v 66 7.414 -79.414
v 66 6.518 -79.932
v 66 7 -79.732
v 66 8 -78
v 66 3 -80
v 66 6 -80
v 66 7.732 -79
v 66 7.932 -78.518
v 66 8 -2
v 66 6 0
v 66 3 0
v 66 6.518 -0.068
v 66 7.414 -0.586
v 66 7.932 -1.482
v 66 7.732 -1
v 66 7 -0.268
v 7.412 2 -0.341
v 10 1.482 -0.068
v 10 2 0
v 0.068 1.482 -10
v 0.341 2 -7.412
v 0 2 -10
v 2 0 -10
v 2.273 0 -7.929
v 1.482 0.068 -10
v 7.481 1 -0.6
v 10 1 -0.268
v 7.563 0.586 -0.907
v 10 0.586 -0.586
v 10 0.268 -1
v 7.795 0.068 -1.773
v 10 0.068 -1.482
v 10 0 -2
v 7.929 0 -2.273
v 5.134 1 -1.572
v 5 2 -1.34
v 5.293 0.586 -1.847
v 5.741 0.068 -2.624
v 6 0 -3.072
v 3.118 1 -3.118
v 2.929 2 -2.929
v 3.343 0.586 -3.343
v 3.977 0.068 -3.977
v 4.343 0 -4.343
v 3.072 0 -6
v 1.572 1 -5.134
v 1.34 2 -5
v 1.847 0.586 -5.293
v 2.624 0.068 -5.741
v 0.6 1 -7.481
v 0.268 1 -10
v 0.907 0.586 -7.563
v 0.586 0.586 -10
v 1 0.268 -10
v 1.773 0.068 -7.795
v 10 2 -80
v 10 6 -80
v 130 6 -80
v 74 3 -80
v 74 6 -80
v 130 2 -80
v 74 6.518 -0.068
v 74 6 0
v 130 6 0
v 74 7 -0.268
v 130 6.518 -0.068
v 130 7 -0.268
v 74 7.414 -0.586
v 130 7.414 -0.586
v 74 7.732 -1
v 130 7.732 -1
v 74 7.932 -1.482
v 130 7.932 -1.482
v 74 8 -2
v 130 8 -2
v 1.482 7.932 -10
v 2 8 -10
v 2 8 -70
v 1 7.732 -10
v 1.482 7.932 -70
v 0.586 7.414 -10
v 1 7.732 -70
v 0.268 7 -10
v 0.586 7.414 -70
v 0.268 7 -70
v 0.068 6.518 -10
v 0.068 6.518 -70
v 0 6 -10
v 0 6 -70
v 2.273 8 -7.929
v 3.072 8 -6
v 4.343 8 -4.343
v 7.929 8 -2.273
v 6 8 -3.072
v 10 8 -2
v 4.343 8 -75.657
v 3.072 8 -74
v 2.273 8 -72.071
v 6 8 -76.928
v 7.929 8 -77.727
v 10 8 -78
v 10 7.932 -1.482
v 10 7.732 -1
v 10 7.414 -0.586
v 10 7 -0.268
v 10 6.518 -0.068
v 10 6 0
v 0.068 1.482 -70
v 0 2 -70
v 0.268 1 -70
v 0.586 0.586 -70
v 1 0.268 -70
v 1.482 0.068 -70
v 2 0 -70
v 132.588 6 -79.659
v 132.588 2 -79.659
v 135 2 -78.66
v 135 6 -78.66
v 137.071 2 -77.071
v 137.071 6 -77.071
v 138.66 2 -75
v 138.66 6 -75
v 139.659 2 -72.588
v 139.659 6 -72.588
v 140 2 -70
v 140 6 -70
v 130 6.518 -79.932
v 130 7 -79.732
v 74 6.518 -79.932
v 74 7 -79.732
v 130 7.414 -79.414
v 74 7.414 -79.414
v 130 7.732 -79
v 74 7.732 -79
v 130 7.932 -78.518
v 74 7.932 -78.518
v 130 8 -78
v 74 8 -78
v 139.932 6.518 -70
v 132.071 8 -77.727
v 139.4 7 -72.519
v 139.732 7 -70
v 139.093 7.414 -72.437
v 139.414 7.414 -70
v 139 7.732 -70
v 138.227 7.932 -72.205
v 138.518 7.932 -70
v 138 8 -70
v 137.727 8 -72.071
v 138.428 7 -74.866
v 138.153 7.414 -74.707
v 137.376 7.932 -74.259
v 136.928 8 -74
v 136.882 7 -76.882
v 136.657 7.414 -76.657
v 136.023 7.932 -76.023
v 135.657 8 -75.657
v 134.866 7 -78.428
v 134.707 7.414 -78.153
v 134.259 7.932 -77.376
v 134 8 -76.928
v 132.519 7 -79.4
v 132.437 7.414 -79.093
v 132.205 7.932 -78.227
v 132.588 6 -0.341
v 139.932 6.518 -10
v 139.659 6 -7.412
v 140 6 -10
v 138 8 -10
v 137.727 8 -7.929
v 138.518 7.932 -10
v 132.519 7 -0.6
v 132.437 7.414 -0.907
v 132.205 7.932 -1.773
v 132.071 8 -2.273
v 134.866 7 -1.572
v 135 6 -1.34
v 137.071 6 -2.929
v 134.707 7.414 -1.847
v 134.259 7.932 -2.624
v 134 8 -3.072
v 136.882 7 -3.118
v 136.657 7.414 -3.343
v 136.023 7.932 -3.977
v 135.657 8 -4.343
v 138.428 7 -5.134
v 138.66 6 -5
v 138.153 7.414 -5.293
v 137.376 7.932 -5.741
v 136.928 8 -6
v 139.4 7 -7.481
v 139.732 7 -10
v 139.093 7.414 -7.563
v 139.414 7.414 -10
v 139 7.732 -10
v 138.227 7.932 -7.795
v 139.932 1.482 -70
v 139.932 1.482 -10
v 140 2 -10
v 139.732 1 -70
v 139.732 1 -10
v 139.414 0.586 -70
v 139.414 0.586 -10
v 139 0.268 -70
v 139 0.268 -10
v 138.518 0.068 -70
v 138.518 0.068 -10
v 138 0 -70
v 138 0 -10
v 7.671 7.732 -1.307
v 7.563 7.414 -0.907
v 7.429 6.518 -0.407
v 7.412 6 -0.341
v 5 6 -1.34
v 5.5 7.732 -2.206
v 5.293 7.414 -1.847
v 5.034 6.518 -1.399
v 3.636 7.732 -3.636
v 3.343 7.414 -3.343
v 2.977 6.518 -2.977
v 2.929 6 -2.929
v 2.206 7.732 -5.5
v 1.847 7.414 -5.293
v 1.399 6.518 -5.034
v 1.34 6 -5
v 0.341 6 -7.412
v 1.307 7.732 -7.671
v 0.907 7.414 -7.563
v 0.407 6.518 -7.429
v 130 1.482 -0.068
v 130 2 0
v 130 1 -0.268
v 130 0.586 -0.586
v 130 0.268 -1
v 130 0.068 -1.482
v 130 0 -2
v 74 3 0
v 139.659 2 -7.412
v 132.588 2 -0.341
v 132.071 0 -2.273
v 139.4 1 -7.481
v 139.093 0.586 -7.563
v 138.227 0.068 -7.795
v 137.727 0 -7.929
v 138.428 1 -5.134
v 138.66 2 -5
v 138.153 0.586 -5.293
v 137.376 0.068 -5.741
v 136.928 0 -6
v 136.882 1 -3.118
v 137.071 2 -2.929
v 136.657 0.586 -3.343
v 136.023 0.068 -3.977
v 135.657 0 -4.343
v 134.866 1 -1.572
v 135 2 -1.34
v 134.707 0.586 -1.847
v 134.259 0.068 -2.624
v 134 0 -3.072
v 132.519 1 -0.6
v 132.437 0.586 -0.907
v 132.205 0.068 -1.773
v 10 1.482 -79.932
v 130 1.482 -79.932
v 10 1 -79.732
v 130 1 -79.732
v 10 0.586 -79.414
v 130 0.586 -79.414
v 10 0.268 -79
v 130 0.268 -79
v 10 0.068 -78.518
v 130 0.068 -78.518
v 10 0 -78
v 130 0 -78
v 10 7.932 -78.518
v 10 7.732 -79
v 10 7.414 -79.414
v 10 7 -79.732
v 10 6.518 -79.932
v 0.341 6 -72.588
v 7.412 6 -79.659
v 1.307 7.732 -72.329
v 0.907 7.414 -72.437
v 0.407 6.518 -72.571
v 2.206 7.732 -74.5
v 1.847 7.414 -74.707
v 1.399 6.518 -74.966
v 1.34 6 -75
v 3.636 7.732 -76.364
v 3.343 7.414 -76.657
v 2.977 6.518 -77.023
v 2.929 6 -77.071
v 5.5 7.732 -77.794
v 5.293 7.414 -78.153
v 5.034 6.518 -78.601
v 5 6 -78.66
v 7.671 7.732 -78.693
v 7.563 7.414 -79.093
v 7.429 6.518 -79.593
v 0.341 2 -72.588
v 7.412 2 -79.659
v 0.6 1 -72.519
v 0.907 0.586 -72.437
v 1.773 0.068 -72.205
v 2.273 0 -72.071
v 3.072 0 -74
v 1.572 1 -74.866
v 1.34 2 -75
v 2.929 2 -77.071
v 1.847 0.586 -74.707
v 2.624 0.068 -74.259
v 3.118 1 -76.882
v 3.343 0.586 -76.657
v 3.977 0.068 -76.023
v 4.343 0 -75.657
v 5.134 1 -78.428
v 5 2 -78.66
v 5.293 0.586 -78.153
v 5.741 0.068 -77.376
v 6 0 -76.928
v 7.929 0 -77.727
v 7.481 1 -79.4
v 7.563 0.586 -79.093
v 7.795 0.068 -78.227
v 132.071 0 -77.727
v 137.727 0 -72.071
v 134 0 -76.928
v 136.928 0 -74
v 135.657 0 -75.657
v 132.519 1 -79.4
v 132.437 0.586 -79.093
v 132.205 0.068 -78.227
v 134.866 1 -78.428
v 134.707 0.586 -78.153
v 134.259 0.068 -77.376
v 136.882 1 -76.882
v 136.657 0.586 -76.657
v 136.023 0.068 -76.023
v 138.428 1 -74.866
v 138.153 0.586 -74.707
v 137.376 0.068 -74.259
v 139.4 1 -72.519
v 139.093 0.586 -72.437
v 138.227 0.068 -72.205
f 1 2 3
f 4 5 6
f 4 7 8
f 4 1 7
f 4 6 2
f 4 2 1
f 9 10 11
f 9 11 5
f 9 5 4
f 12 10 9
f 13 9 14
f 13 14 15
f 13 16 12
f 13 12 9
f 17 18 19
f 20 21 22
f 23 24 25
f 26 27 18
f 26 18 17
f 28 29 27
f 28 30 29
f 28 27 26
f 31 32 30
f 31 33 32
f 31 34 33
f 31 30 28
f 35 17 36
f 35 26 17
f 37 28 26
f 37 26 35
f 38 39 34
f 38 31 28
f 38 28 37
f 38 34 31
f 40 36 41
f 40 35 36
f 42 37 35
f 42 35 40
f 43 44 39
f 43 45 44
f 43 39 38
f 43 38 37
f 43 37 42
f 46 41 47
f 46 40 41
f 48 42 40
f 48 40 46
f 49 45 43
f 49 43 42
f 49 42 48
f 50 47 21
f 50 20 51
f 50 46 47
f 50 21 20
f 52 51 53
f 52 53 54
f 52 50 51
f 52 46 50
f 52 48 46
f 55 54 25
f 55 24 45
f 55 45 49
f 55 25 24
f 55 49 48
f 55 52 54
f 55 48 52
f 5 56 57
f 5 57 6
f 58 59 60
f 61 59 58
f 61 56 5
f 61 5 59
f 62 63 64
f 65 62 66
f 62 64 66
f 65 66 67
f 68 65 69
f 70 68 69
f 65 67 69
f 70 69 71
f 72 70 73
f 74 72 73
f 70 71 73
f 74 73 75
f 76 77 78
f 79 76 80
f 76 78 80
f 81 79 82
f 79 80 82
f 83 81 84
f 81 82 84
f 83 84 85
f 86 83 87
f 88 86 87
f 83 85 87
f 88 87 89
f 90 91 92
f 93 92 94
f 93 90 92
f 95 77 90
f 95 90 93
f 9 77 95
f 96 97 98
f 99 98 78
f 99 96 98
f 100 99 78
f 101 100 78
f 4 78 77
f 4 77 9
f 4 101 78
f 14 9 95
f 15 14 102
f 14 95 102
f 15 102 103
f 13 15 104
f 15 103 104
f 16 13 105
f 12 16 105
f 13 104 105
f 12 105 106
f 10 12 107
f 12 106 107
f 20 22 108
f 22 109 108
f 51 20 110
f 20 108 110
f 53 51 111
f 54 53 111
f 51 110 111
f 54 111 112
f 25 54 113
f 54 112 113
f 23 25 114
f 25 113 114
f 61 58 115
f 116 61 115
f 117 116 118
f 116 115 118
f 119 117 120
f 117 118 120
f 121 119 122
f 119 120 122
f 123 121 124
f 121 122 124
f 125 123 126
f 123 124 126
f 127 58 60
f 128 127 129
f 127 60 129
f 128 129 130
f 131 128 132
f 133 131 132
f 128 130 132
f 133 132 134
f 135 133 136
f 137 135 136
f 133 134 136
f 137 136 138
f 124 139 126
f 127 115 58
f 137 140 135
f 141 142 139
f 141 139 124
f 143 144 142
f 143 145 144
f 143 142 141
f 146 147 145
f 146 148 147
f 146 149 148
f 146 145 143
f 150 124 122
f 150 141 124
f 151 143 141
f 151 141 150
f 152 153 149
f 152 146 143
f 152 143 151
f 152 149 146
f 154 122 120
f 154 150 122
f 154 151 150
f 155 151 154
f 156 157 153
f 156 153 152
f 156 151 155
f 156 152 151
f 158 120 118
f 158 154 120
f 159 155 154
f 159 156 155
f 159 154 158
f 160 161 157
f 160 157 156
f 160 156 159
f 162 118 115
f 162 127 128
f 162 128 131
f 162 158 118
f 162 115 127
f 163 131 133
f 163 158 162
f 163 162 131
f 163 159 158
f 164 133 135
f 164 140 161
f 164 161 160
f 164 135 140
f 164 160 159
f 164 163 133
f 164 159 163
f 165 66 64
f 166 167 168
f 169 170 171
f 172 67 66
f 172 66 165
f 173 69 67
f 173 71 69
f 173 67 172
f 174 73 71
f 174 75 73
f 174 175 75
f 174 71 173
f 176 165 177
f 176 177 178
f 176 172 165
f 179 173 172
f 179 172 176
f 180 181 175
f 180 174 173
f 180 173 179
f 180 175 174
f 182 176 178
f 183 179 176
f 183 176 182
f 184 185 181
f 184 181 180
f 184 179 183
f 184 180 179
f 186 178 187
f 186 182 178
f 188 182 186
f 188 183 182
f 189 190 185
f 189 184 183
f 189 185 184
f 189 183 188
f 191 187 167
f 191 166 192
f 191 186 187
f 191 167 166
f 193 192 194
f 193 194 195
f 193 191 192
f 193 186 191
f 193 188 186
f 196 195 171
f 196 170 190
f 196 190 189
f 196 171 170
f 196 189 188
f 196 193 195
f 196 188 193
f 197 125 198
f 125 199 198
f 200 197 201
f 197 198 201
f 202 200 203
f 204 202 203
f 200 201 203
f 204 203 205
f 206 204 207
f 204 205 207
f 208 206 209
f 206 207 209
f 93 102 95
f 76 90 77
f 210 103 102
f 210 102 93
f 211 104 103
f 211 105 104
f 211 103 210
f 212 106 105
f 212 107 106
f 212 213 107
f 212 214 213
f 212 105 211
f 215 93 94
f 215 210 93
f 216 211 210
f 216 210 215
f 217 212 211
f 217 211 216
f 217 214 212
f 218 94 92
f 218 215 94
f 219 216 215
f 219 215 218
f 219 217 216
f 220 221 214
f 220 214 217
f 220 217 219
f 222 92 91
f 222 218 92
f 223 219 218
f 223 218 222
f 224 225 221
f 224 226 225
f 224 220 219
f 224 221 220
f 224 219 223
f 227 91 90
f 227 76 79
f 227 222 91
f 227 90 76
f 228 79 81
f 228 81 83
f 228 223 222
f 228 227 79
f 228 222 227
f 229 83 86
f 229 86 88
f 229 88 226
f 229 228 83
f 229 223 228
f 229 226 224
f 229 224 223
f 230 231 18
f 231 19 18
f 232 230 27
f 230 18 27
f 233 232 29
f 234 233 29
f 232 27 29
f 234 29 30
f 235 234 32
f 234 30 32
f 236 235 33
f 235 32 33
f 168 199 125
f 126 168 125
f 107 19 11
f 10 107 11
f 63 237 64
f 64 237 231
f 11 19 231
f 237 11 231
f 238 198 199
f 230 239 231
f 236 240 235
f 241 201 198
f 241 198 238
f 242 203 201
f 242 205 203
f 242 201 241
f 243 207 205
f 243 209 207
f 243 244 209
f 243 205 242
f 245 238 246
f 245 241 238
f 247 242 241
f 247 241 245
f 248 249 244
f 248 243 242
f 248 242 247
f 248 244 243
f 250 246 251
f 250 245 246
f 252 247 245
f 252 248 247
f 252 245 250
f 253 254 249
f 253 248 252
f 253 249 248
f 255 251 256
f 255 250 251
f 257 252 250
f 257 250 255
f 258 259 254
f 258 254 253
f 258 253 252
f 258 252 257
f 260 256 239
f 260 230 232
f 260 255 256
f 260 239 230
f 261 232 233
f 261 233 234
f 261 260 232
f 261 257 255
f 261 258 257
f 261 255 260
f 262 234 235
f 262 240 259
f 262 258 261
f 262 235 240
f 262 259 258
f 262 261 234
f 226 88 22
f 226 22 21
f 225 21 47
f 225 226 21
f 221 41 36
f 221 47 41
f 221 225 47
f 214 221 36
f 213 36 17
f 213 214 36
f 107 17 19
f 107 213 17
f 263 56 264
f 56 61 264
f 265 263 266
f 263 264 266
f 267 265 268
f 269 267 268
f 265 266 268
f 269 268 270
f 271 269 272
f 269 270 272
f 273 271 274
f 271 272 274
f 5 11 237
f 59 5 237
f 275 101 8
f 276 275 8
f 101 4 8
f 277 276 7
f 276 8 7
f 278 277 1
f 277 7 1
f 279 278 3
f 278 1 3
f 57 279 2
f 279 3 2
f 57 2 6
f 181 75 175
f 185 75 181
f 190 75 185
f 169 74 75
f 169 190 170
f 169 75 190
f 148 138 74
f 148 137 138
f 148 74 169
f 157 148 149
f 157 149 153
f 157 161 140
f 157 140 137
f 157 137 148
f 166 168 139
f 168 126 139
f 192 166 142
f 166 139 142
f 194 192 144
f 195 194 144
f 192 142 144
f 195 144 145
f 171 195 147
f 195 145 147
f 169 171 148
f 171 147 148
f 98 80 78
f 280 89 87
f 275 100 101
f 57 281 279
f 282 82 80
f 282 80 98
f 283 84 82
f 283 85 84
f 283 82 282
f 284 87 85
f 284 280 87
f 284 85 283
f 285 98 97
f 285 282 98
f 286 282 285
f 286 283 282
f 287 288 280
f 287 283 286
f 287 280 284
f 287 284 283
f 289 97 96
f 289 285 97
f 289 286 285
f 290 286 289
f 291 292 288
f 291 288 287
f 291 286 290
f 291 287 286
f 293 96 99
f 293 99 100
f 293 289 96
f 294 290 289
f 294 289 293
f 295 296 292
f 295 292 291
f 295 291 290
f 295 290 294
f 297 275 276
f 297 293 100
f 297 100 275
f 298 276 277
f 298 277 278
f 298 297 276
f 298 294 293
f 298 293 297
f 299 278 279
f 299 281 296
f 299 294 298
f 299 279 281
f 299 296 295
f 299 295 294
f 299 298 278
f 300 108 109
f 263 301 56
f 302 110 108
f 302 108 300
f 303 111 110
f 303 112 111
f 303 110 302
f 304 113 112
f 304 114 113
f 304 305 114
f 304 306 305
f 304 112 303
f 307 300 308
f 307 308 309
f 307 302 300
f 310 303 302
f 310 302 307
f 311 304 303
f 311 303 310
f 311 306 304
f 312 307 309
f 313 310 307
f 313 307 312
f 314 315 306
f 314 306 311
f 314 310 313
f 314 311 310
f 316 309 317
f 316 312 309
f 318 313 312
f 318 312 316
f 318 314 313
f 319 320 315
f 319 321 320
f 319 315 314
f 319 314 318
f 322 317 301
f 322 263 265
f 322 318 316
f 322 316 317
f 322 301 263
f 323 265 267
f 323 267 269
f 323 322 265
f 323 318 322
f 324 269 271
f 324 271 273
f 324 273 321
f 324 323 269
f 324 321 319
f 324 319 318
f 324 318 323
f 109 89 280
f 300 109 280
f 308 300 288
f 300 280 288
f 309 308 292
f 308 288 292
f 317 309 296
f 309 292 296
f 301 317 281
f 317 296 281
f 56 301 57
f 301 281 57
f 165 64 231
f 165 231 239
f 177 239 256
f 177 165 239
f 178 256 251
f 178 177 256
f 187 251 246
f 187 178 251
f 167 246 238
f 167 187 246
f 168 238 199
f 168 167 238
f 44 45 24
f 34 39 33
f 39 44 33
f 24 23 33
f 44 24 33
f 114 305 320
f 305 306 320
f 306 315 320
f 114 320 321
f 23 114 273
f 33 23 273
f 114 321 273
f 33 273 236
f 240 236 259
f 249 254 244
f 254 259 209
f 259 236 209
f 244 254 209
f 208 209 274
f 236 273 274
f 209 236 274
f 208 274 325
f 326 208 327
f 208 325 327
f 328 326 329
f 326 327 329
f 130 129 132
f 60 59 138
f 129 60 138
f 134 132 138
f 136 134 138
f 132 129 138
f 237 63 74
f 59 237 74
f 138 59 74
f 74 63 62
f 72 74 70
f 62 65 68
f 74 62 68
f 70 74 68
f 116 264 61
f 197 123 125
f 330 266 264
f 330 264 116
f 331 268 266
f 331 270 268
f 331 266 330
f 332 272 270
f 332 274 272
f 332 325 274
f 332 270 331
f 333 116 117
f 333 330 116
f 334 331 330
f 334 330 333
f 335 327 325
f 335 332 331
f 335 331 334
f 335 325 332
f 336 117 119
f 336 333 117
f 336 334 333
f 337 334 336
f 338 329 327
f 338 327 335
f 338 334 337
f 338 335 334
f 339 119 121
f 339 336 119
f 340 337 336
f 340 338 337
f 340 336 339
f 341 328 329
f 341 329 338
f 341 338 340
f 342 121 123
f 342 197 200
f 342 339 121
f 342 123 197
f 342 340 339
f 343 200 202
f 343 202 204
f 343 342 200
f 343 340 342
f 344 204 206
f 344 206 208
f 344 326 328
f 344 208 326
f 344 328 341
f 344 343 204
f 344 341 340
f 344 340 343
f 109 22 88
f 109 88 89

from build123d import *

# Parameters (mm, degrees)
SKICA1_W                 = 140
SKICA1_H                 = 80
P_IDAT_VYSUNUT_M1_DEPTH  = 8
ODEBRAT_VYSUNUT_M1_REACH = 82
SKICA2_W                 = 8
SKICA2_H                 = 5
ZAOBLIT1_R               = 10
ZAOBLIT3_R               = 2


with BuildPart() as part:
    # Skica1 → Přidat vysunutím1 (new body)
    with BuildSketch(Plane(origin=(0, 0, 0), x_dir=(1, 0, 0), z_dir=(0, 1, 0))):
        with Locations((70, 40)):
            Rectangle(SKICA1_W, SKICA1_H)
    extrude(amount=P_IDAT_VYSUNUT_M1_DEPTH)

    # Skica2 → Odebrat vysunutím1 (cut, up to next)
    with BuildSketch(Plane.XY, mode=Mode.PRIVATE) as odebrat_vysunut_m1_sk1:
        with Locations((70, 5.5)):
            Rectangle(SKICA2_W, SKICA2_H)
    odebrat_vysunut_m1_tool1 = extrude(odebrat_vysunut_m1_sk1.sketch, amount=-ODEBRAT_VYSUNUT_M1_REACH, mode=Mode.PRIVATE) & part.part
    add(odebrat_vysunut_m1_tool1.solids().sort_by_distance((70, 5.5, 0))[0], mode=Mode.SUBTRACT)

    # Zaoblit1
    zaoblit1_edges = [part.edges().sort_by_distance(p)[0] for p in [
        (0, 4, -80),
        (140, 4, -80),
        (140, 4, 0),
        (0, 4, 0),
    ]]
    fillet(zaoblit1_edges, radius=ZAOBLIT1_R)

    # Zaoblit3
    zaoblit3_edges = [part.edges().sort_by_distance(p)[0] for p in [
        (102, 8, 0),
        (38, 8, -80),
        (0, 0, -40),
        (0, 8, -40),
        (70, 0, -80),
        (140, 0, -40),
        (70, 0, 0),
        (2.928932188, 0, -2.928932188),
        (137.071067812, 0, -2.928932188),
        (137.071067812, 0, -77.071067812),
        (2.928932188, 0, -77.071067812),
        (102, 8, -80),
        (38, 8, 0),
        (2.928932188, 8, -2.928932188),
        (2.928932188, 8, -77.071067812),
        (140, 8, -40),
        (137.071067812, 8, -2.928932188),
        (137.071067812, 8, -77.071067812),
    ]]
    fillet(zaoblit3_edges, radius=ZAOBLIT3_R)


solid = part.part
